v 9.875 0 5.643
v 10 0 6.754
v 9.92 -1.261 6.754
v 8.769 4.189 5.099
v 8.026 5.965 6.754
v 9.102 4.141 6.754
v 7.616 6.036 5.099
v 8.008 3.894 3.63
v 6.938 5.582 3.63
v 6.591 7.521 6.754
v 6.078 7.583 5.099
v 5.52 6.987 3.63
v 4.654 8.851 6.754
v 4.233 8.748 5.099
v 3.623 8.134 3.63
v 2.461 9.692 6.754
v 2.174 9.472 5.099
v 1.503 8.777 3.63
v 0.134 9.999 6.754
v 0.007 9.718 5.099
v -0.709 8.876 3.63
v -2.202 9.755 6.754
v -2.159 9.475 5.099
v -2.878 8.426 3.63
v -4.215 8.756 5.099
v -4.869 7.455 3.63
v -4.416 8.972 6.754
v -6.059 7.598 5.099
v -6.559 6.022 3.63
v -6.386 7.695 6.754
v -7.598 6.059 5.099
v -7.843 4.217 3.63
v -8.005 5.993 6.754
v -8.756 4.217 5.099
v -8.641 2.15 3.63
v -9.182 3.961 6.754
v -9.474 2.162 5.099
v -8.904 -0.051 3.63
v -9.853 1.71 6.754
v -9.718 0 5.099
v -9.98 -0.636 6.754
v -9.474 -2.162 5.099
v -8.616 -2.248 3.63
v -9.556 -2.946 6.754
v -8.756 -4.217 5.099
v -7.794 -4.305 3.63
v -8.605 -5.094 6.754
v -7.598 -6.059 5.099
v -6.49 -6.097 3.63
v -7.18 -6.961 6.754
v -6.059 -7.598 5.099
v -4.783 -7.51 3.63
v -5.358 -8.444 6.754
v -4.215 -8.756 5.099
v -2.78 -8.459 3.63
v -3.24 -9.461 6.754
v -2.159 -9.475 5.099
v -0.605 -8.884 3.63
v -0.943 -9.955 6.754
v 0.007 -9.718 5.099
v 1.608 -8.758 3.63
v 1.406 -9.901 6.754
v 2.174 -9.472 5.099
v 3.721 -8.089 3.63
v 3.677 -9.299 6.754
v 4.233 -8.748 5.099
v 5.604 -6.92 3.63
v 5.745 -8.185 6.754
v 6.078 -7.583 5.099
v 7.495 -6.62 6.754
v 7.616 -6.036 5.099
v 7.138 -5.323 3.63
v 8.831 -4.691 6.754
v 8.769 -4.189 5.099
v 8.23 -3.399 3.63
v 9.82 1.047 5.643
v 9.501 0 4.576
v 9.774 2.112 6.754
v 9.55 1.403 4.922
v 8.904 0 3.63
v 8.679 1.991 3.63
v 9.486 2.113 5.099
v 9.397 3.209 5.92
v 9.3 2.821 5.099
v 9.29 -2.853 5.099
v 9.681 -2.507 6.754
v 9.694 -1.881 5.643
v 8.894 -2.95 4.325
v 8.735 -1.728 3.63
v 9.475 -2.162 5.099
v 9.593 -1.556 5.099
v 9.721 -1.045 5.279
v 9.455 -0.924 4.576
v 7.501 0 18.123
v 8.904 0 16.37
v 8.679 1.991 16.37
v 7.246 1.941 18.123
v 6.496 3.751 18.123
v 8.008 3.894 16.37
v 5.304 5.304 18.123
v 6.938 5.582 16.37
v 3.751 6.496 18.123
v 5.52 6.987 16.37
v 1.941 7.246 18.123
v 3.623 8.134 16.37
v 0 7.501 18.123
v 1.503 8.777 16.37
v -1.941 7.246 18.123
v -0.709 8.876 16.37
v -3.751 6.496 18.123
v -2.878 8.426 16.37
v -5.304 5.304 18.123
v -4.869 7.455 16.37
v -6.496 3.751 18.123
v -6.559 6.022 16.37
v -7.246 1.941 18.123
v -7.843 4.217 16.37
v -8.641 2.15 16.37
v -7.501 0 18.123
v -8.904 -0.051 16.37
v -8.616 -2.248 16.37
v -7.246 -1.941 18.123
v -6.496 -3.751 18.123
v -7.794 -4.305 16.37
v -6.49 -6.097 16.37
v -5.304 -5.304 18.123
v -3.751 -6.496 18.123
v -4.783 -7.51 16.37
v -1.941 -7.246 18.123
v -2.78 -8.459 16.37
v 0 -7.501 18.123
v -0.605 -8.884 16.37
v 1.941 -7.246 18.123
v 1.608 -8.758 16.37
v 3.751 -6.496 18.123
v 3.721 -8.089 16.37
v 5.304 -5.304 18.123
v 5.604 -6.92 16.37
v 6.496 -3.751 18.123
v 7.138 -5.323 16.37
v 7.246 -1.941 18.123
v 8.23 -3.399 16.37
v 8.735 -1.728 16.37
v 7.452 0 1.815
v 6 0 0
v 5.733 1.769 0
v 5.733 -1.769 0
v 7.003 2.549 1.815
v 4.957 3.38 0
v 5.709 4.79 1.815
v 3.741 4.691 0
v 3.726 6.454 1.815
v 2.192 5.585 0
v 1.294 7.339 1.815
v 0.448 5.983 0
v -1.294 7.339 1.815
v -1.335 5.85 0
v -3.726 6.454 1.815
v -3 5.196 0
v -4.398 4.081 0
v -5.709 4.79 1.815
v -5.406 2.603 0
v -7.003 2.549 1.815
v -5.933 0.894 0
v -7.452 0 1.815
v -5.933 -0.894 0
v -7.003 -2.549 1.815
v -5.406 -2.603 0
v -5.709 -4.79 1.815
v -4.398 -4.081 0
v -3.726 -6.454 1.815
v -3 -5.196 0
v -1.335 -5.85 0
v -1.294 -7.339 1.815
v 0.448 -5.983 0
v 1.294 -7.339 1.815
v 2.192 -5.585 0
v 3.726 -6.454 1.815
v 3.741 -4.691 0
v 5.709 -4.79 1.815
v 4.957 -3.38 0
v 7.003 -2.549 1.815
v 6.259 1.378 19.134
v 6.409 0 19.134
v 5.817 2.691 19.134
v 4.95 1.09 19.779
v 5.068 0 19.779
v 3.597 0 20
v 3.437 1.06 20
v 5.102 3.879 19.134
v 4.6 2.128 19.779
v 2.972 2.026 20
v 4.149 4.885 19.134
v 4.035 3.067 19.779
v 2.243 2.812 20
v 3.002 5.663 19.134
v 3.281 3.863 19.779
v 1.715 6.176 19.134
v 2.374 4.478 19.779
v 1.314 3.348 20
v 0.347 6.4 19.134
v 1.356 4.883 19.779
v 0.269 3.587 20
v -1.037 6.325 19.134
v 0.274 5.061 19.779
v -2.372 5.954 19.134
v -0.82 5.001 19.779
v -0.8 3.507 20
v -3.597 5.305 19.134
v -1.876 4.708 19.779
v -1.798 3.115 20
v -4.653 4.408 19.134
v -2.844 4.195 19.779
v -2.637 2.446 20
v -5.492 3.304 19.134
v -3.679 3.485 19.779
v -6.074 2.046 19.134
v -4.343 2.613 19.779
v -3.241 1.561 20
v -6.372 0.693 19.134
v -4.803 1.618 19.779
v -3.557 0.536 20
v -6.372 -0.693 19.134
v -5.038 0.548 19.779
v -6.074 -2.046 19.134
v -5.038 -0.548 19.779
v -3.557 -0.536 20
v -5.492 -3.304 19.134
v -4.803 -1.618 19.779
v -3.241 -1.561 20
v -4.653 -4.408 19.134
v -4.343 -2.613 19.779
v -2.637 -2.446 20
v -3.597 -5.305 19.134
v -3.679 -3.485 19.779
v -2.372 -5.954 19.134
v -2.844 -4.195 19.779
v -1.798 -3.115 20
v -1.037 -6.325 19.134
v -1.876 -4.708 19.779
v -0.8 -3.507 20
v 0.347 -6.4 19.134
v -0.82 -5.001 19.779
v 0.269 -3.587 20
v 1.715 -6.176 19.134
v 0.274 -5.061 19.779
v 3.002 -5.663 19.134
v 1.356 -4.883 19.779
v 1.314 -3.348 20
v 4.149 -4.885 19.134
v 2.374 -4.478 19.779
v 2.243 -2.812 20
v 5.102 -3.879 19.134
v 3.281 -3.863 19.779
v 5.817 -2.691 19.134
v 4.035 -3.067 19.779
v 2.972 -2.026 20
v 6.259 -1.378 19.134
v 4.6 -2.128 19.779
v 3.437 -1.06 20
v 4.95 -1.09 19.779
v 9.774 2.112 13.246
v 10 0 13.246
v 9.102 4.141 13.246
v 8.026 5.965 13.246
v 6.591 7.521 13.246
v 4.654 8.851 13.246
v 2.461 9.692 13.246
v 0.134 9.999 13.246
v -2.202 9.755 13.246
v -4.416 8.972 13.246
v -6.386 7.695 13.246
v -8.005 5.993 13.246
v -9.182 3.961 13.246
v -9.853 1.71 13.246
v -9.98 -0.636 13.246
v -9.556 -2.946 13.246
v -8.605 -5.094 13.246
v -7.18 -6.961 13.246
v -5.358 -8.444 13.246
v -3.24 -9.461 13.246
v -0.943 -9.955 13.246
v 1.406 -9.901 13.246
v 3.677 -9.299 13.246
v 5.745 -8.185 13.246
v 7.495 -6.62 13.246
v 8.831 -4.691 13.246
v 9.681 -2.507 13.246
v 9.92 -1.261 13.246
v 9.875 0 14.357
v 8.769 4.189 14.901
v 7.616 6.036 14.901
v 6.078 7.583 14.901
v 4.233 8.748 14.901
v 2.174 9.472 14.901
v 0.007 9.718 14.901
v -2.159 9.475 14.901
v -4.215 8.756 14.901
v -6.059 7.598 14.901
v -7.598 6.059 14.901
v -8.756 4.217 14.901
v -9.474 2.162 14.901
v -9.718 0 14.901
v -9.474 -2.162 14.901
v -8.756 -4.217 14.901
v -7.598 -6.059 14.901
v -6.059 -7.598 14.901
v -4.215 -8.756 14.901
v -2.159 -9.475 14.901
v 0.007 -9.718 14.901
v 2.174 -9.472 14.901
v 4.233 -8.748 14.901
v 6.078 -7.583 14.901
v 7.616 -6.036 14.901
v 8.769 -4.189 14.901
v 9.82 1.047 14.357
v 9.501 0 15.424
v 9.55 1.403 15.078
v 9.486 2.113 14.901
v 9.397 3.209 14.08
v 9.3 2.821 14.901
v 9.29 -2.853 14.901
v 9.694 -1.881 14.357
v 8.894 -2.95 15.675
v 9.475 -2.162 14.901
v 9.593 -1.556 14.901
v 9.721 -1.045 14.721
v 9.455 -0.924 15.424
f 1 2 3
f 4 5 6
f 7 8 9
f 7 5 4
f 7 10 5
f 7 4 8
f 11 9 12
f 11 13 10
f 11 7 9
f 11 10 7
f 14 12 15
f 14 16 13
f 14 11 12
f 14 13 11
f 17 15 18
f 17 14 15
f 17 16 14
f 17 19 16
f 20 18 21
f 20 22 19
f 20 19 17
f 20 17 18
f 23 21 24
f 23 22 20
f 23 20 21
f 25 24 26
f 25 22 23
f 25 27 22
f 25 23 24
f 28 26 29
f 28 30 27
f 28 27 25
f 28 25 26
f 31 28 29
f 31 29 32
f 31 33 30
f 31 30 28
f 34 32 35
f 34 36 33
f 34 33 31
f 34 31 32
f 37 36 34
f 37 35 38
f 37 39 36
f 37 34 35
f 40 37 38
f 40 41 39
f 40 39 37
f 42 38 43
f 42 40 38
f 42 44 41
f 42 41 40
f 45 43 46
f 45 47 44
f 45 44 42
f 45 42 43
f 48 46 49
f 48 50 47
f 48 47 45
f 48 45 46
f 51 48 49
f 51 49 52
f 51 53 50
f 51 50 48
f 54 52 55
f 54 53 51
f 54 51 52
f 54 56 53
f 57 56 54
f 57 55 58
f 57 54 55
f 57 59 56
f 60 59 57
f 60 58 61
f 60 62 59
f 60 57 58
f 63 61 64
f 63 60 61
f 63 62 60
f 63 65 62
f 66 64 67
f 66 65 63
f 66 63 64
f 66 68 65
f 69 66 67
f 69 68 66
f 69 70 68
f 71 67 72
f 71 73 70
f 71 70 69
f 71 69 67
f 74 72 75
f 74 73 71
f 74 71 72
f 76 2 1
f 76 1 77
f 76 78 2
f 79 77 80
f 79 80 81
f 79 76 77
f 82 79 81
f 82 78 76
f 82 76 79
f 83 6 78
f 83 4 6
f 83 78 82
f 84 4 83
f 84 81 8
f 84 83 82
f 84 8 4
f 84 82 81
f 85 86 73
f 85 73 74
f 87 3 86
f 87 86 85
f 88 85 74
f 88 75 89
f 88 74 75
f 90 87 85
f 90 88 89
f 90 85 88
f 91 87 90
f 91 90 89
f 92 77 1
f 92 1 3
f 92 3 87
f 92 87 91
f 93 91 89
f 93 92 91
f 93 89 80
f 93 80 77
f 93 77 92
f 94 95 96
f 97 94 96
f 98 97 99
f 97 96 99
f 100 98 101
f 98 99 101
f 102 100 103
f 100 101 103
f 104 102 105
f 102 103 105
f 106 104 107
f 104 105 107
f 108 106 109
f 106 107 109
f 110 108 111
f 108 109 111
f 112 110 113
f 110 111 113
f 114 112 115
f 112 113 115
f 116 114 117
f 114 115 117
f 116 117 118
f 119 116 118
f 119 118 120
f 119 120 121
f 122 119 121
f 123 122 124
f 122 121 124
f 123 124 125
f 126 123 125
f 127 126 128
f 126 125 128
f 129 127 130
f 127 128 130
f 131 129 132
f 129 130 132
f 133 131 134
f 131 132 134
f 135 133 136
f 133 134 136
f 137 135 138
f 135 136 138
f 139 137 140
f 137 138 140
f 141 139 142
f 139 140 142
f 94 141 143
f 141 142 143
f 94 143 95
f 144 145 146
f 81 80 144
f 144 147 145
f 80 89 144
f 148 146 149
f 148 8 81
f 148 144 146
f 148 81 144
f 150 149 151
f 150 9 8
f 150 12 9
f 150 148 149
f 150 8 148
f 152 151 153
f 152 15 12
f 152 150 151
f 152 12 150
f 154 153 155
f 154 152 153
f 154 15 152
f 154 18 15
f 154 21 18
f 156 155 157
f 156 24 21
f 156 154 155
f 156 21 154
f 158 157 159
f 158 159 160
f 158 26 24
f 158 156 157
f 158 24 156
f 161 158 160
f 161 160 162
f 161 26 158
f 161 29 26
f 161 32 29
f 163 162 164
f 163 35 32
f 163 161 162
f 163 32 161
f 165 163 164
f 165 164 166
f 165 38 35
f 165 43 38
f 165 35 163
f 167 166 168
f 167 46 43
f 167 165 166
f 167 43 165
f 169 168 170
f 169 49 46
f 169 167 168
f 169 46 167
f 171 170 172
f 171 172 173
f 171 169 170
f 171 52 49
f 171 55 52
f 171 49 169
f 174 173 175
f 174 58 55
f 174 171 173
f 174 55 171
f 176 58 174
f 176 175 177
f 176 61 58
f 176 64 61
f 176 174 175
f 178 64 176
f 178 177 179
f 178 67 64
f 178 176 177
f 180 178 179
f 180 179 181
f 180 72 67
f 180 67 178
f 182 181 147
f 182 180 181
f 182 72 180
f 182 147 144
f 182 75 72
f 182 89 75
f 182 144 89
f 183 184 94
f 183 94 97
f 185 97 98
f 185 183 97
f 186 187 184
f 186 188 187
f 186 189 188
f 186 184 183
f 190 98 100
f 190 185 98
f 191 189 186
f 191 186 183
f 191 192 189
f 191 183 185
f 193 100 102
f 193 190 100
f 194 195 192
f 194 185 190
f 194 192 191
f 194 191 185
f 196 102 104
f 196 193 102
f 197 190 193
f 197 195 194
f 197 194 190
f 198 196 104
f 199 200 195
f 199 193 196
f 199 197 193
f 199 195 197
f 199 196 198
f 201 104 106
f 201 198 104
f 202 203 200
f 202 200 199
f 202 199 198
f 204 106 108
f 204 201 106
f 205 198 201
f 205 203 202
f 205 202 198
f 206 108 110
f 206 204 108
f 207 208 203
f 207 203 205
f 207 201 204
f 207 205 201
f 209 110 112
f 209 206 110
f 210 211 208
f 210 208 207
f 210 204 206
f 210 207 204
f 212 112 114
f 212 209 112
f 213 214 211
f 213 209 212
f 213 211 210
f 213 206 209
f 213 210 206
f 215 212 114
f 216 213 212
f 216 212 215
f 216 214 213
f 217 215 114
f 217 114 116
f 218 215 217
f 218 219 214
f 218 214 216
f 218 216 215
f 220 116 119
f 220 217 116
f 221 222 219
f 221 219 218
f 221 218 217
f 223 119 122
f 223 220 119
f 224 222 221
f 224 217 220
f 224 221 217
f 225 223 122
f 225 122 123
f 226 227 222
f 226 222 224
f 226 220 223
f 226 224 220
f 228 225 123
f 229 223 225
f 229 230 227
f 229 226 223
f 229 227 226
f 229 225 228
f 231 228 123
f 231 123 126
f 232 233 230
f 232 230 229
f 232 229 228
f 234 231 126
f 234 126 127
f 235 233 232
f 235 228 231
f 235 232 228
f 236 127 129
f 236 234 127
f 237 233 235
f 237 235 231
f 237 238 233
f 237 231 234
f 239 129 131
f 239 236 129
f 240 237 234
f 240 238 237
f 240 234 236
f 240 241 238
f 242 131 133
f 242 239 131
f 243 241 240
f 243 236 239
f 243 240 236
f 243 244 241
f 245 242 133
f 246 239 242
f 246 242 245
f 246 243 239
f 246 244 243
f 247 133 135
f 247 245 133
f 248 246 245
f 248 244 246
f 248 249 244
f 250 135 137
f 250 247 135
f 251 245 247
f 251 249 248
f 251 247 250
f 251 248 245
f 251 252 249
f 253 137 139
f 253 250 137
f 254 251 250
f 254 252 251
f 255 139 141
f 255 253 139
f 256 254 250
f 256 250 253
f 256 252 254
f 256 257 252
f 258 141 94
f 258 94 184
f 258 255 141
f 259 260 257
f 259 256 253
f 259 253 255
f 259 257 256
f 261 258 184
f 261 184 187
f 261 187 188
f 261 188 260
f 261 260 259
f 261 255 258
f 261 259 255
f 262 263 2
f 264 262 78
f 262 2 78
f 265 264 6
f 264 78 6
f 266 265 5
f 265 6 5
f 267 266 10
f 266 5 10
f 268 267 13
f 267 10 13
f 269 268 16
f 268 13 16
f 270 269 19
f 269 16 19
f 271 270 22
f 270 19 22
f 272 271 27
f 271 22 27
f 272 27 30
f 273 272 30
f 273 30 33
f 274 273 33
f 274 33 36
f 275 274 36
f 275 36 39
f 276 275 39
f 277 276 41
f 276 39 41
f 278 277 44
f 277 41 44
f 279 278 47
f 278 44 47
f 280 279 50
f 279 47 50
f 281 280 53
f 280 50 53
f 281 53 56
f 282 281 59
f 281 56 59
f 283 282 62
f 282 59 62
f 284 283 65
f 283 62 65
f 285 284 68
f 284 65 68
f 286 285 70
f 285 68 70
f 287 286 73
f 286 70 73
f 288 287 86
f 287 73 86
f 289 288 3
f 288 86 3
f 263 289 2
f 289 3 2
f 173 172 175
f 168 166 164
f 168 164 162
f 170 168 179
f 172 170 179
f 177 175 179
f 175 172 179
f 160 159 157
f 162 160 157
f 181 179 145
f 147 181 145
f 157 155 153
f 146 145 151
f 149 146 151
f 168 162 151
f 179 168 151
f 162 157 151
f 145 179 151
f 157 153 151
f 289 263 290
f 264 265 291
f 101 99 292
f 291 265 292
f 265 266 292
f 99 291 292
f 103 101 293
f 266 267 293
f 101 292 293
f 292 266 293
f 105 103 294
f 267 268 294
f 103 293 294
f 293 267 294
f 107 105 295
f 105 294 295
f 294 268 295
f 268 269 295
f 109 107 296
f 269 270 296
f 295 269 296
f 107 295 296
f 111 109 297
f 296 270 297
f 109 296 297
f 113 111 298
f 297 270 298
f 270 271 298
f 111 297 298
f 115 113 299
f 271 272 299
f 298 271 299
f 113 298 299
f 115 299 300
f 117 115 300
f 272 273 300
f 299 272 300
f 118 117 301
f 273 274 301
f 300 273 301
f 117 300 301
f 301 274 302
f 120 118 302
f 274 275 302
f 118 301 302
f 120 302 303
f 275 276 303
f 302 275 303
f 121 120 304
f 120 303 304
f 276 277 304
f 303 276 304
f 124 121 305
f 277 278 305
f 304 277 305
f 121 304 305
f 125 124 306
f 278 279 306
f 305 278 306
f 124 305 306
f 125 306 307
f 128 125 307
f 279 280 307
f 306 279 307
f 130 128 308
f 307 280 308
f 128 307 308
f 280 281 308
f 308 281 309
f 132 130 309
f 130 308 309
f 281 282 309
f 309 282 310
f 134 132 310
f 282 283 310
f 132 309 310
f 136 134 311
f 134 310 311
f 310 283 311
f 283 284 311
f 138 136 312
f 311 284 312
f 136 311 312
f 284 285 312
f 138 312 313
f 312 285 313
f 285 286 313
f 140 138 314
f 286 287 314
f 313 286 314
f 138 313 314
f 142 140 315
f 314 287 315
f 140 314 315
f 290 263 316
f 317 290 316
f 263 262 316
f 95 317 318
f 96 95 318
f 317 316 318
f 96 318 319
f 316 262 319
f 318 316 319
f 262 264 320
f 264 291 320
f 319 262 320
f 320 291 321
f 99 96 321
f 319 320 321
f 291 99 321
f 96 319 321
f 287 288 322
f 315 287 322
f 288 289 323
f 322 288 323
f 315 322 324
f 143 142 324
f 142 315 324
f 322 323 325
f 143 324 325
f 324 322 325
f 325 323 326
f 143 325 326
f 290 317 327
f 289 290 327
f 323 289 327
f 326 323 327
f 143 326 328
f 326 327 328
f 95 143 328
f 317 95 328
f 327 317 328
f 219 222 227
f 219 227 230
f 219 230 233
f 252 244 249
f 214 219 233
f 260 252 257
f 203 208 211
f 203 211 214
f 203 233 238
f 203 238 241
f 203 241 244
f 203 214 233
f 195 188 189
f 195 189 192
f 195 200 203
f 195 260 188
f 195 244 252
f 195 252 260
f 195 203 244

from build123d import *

# Parameters (mm, degrees)
F0_R       = 10
F1_DEPTH   = 20
F2_SIZE2   = 5
F2_SIZE    = 4
F2_2_SIZE2 = 5
F2_2_SIZE  = 4
F3_R       = 5


with BuildPart() as f1:
    # F0 (on Top) → F1 (new body)
    with BuildSketch(Plane.XY):
        Circle(F0_R)
    extrude(amount=F1_DEPTH)

    # F2
    f2_edges = [f1.edges().sort_by_distance(p)[0] for p in [
        (-10, 0, 20),
    ]]
    f2_side = f1.faces().sort_by_distance((0, 0, 20))[0]
    chamfer(f2_edges, length=F2_SIZE, length2=F2_SIZE2, reference=f2_side)

    # F2#2
    f2_2_edges = [f1.edges().sort_by_distance(p)[0] for p in [
        (-10, 0, 0),
    ]]
    f2_2_side = f1.faces().sort_by_distance((0, 0, 0))[0]
    chamfer(f2_2_edges, length=F2_2_SIZE, length2=F2_2_SIZE2, reference=f2_2_side)

    # F3
    f3_edges = [f1.edges().sort_by_distance(p)[0] for p in [
        (-10, 0, 15),
        (-6, 0, 20),
        (-10, 0, 5),
    ]]
    fillet(f3_edges, radius=F3_R)


solid = f1.part
